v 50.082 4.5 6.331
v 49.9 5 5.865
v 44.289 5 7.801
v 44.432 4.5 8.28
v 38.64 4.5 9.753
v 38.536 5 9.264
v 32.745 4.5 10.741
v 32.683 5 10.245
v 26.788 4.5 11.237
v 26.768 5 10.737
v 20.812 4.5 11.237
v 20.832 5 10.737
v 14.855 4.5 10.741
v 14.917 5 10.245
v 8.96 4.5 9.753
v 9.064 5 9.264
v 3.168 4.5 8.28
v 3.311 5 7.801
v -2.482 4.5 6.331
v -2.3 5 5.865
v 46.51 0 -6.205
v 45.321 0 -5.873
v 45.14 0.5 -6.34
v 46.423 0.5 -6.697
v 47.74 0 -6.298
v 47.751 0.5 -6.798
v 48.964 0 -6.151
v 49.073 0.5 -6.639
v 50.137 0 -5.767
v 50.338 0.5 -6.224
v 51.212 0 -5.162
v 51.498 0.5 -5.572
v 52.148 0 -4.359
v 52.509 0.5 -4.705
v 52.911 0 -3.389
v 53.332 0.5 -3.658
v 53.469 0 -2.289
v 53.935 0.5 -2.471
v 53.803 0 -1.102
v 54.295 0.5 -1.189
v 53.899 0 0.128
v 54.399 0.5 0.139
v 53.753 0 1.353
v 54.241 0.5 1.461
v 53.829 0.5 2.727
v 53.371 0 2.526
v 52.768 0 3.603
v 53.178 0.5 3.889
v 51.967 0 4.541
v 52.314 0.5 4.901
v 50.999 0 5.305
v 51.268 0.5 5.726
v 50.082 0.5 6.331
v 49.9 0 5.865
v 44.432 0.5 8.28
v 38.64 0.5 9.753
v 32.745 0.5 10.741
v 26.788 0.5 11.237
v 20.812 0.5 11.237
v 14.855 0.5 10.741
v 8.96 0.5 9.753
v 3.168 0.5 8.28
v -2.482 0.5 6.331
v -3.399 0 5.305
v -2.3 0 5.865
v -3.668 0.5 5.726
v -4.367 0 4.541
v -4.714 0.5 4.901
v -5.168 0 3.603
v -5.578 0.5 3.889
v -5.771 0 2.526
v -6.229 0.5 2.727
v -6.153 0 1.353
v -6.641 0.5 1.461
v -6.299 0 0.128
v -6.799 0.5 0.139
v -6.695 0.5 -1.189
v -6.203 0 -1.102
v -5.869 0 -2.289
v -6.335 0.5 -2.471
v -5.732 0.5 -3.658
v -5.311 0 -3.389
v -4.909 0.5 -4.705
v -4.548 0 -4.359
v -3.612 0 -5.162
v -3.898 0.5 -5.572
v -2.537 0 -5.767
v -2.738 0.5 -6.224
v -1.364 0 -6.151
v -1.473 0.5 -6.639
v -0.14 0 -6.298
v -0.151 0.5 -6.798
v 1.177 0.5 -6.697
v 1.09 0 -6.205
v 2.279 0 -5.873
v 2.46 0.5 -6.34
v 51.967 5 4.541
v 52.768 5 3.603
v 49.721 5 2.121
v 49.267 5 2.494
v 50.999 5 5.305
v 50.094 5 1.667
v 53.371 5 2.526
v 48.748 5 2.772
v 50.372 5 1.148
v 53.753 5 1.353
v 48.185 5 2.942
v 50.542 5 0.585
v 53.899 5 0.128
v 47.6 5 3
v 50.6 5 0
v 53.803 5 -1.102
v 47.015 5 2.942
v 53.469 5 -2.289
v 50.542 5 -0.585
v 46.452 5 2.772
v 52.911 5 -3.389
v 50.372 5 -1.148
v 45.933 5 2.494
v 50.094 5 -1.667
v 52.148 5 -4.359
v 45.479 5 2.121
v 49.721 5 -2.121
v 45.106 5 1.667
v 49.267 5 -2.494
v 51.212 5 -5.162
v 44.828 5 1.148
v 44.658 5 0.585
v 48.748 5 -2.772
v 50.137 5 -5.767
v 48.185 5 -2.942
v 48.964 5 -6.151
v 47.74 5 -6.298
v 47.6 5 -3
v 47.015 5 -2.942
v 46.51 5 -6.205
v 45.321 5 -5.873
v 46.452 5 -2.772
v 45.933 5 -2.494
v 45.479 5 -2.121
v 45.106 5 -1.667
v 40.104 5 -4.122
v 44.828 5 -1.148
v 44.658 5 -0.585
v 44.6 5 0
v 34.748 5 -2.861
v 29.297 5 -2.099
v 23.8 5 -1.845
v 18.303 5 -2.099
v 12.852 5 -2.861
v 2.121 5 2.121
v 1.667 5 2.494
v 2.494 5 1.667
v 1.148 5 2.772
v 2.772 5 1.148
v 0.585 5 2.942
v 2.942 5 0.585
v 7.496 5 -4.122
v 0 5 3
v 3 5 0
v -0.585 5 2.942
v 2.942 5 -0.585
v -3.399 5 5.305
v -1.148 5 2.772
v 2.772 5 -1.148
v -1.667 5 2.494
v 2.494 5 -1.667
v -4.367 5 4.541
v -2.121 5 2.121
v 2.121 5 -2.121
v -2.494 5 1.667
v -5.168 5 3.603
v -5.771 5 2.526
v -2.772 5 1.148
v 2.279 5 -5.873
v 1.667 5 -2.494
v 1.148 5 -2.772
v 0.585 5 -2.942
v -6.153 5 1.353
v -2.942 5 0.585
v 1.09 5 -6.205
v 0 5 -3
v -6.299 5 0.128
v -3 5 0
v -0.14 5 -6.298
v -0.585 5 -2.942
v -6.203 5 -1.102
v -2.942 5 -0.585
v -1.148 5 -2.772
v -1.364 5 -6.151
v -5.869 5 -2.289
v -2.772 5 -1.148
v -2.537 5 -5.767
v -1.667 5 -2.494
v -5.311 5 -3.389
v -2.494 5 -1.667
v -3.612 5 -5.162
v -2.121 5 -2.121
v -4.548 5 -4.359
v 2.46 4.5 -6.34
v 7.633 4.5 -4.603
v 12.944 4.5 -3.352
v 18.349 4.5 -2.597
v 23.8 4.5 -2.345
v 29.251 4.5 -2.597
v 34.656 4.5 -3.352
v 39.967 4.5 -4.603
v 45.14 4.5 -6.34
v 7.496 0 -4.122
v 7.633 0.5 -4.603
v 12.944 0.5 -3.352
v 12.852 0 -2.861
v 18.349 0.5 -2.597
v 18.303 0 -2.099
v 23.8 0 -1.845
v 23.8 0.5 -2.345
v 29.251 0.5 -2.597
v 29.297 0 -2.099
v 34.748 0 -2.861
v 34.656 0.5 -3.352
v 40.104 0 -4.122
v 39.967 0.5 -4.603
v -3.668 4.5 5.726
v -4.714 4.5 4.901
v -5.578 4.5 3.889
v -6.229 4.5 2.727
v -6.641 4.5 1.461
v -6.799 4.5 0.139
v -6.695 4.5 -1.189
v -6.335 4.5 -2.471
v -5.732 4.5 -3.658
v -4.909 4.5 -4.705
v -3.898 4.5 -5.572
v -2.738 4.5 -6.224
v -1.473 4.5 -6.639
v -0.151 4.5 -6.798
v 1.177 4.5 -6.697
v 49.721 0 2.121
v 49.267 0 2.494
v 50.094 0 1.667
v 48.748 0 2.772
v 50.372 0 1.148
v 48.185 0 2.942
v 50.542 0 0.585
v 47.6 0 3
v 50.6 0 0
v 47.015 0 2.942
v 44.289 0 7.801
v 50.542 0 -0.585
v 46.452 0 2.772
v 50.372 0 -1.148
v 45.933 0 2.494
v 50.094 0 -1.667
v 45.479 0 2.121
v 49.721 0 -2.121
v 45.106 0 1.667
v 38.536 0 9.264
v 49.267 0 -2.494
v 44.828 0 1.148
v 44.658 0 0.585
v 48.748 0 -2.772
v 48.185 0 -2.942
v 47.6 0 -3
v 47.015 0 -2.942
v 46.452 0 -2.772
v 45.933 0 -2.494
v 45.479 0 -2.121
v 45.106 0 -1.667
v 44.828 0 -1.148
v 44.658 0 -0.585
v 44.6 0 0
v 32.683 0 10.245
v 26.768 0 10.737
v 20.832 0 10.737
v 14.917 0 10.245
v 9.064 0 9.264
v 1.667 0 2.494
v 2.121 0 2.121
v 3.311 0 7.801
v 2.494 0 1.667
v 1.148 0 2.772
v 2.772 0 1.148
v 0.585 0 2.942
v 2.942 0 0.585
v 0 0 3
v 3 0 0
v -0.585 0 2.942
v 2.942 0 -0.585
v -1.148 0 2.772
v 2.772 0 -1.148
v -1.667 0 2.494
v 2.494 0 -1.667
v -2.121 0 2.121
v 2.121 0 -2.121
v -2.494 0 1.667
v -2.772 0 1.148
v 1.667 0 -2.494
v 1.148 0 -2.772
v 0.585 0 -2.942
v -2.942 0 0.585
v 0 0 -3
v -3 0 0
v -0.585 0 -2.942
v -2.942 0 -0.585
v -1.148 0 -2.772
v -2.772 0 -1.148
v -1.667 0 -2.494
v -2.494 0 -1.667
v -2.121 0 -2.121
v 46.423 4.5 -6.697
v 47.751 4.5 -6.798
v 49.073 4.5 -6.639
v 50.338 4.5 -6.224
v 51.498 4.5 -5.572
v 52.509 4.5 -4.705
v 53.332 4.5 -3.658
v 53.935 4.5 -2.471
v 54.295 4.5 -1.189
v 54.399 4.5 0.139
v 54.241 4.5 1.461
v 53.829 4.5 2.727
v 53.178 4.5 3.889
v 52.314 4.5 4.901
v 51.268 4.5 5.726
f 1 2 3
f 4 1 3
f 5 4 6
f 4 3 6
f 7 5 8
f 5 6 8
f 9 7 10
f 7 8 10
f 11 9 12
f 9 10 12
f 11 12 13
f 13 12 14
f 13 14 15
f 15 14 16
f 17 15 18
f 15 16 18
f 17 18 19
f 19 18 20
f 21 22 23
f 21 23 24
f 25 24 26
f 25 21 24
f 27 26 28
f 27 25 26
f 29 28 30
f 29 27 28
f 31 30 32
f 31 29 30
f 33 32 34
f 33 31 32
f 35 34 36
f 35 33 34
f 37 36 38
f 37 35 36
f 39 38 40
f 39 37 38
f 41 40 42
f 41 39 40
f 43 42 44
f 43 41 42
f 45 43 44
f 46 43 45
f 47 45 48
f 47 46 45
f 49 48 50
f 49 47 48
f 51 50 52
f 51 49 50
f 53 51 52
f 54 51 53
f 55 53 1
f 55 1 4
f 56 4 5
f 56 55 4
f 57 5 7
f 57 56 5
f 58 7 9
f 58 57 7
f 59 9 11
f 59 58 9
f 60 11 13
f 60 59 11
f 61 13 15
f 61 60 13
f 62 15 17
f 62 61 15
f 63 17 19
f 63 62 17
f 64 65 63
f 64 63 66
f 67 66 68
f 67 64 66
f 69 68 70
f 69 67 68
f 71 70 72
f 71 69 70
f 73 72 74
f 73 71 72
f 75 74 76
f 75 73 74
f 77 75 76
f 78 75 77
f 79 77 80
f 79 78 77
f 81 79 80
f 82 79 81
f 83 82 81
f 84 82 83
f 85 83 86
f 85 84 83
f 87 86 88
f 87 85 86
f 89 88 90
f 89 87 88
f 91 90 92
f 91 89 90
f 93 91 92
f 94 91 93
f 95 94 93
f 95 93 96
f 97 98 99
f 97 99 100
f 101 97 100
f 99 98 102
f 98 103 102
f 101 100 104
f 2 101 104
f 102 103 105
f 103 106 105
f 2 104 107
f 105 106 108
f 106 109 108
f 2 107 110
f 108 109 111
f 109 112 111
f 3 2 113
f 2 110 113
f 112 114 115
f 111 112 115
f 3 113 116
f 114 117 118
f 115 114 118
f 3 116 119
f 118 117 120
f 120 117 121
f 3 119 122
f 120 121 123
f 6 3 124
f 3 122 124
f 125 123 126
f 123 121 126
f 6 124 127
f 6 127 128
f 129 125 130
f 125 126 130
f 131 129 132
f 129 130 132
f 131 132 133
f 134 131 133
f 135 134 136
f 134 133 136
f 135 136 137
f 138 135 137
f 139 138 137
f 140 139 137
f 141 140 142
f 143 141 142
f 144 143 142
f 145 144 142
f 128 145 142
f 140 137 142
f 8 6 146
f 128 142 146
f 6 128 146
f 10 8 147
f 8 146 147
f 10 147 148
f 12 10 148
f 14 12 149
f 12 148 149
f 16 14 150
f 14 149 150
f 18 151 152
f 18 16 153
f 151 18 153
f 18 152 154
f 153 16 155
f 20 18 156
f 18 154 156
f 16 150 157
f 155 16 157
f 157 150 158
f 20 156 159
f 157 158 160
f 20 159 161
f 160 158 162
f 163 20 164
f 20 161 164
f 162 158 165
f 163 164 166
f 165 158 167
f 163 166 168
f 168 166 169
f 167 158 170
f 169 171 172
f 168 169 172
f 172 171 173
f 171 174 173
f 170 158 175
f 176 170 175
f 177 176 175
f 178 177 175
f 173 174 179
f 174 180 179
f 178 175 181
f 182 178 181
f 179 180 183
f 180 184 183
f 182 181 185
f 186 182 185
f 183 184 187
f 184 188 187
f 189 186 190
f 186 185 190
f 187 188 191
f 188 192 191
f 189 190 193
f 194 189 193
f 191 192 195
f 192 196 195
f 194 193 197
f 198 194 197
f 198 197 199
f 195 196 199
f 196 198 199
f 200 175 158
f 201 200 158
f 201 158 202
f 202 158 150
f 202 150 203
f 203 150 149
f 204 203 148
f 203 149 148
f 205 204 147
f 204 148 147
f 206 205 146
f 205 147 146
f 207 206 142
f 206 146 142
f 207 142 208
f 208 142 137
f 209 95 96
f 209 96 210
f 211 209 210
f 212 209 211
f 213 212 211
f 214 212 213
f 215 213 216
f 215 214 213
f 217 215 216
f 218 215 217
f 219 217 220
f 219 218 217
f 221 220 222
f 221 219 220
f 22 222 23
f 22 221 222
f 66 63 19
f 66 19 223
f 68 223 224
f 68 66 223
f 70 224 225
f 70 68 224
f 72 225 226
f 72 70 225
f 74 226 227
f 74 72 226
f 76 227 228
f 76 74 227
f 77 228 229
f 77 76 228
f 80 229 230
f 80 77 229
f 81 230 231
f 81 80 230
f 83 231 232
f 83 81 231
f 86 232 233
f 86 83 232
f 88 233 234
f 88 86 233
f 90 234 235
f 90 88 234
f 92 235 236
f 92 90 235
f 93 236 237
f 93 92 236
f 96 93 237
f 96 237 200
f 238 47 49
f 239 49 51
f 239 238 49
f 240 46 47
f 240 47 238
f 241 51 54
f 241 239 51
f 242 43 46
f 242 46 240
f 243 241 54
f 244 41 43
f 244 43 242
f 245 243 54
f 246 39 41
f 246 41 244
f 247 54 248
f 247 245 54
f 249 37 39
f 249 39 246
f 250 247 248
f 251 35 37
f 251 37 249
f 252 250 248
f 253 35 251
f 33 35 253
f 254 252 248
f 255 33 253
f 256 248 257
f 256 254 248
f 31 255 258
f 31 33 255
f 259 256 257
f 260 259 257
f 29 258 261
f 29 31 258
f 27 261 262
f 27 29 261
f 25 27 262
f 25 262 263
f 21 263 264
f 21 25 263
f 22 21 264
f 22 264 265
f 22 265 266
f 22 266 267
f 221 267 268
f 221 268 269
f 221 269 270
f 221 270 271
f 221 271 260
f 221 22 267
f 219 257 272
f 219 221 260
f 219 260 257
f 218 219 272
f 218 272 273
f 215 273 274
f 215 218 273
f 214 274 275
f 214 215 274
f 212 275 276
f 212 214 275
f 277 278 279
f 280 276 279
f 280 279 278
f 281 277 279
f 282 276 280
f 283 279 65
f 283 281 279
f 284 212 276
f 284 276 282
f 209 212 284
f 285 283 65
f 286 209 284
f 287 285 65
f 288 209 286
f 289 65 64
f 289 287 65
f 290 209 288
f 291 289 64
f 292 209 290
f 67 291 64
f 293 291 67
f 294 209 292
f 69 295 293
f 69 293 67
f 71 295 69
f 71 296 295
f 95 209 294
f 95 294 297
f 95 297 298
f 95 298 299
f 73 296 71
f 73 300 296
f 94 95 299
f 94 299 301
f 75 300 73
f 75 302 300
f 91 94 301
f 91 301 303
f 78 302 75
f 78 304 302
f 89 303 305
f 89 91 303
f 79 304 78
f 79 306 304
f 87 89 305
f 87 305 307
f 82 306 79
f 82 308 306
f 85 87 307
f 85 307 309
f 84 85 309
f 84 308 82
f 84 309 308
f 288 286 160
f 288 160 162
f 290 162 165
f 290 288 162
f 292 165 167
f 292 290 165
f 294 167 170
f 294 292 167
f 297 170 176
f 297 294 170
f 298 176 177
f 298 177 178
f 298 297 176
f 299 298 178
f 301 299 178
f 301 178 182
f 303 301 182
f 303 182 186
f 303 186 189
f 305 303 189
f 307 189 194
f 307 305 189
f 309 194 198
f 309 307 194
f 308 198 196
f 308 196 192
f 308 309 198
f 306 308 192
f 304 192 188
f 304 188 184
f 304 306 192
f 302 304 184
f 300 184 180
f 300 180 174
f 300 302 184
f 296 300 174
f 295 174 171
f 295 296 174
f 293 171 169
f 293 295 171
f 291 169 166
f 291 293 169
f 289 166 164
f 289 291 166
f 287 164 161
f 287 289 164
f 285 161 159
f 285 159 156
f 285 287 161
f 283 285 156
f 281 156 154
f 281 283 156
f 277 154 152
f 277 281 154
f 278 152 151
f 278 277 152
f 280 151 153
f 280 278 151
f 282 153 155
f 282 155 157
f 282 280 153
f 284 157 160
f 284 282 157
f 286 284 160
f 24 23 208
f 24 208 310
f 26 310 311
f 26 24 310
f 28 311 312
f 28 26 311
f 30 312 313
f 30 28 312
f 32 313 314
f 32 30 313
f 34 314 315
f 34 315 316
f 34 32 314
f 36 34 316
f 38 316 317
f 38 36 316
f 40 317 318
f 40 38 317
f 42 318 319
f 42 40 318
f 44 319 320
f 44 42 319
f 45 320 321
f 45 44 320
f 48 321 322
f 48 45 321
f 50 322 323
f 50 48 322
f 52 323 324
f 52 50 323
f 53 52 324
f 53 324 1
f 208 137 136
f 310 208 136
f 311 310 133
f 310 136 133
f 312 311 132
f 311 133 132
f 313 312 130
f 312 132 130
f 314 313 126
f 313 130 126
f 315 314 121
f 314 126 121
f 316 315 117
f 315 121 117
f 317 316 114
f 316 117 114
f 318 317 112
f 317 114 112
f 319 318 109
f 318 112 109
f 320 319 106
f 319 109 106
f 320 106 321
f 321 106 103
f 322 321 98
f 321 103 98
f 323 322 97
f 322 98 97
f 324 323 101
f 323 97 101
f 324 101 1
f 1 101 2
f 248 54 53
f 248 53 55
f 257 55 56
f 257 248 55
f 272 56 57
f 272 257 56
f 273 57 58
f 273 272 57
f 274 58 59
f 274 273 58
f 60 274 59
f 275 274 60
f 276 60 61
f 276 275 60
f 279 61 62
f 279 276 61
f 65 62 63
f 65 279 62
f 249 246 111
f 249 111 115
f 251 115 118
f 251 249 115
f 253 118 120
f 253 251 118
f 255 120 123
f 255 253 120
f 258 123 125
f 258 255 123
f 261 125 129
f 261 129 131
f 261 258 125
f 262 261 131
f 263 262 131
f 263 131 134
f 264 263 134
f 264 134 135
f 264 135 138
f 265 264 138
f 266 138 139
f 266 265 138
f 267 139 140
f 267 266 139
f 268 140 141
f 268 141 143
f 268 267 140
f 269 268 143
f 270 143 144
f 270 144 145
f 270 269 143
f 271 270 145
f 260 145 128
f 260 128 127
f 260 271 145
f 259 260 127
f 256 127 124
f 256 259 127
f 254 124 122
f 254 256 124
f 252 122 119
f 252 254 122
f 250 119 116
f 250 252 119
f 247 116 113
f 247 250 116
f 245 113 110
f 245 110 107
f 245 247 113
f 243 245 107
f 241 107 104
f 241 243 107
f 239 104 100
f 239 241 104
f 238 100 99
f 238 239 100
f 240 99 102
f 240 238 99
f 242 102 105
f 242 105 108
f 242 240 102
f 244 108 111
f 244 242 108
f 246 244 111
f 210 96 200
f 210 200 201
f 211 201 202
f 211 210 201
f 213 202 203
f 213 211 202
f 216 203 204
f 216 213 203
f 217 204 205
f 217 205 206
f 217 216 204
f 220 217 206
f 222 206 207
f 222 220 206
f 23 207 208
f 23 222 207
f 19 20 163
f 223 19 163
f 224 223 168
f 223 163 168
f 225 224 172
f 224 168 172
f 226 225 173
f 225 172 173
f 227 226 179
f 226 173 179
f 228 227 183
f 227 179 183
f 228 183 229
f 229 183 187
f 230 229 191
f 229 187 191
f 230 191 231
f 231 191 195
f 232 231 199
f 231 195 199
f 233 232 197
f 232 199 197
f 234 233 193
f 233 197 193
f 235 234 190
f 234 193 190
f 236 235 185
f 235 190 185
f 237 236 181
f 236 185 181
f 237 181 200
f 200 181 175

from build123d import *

# Parameters (mm, degrees)
SKETCH_1_R      = 3
EXTRUDE_1_DEPTH = 5
CHAMFER_1_SIZE  = 0.5


with BuildPart() as part:
    # 草图1 → 凸台-拉伸1 (new body)
    with BuildSketch(Plane(origin=(0, 0, 0), x_dir=(1, 0, 0), z_dir=(0, 1, 0))):
        with BuildLine():
            ThreePointArc((45.140425532, 6.339597261), (53.935193412, 2.470895471), (50.082208589, -6.330769347))
            ThreePointArc((50.082208589, -6.330769347), (23.8, -11.299093911), (-2.482208589, -6.330769347))
            ThreePointArc((-2.482208589, -6.330769347), (-6.335193412, 2.470895471), (2.459574468, 6.339597261))
            ThreePointArc((2.459574468, 6.339597261), (23.8, 2.344926441), (45.140425532, 6.339597261))
        make_face()
        Circle(SKETCH_1_R, mode=Mode.SUBTRACT)
        with Locations((47.6, 0)):
            Circle(SKETCH_1_R, mode=Mode.SUBTRACT)
    extrude(amount=EXTRUDE_1_DEPTH)

    # 倒角1
    chamfer_1_edges = [part.edges().sort_by_distance(p)[0] for p in [
        (23.8, 5, 11.299093911),
        (53.935193412, 5, -2.470895471),
        (23.8, 5, -2.344926441),
        (53.935193412, 0, -2.470895471),
        (23.8, 0, 11.299093911),
        (-6.335193412, 0, -2.470895471),
        (23.8, 0, -2.344926441),
        (-6.335193412, 5, -2.470895471),
    ]]
    chamfer(chamfer_1_edges, length=CHAMFER_1_SIZE)


solid = part.part
